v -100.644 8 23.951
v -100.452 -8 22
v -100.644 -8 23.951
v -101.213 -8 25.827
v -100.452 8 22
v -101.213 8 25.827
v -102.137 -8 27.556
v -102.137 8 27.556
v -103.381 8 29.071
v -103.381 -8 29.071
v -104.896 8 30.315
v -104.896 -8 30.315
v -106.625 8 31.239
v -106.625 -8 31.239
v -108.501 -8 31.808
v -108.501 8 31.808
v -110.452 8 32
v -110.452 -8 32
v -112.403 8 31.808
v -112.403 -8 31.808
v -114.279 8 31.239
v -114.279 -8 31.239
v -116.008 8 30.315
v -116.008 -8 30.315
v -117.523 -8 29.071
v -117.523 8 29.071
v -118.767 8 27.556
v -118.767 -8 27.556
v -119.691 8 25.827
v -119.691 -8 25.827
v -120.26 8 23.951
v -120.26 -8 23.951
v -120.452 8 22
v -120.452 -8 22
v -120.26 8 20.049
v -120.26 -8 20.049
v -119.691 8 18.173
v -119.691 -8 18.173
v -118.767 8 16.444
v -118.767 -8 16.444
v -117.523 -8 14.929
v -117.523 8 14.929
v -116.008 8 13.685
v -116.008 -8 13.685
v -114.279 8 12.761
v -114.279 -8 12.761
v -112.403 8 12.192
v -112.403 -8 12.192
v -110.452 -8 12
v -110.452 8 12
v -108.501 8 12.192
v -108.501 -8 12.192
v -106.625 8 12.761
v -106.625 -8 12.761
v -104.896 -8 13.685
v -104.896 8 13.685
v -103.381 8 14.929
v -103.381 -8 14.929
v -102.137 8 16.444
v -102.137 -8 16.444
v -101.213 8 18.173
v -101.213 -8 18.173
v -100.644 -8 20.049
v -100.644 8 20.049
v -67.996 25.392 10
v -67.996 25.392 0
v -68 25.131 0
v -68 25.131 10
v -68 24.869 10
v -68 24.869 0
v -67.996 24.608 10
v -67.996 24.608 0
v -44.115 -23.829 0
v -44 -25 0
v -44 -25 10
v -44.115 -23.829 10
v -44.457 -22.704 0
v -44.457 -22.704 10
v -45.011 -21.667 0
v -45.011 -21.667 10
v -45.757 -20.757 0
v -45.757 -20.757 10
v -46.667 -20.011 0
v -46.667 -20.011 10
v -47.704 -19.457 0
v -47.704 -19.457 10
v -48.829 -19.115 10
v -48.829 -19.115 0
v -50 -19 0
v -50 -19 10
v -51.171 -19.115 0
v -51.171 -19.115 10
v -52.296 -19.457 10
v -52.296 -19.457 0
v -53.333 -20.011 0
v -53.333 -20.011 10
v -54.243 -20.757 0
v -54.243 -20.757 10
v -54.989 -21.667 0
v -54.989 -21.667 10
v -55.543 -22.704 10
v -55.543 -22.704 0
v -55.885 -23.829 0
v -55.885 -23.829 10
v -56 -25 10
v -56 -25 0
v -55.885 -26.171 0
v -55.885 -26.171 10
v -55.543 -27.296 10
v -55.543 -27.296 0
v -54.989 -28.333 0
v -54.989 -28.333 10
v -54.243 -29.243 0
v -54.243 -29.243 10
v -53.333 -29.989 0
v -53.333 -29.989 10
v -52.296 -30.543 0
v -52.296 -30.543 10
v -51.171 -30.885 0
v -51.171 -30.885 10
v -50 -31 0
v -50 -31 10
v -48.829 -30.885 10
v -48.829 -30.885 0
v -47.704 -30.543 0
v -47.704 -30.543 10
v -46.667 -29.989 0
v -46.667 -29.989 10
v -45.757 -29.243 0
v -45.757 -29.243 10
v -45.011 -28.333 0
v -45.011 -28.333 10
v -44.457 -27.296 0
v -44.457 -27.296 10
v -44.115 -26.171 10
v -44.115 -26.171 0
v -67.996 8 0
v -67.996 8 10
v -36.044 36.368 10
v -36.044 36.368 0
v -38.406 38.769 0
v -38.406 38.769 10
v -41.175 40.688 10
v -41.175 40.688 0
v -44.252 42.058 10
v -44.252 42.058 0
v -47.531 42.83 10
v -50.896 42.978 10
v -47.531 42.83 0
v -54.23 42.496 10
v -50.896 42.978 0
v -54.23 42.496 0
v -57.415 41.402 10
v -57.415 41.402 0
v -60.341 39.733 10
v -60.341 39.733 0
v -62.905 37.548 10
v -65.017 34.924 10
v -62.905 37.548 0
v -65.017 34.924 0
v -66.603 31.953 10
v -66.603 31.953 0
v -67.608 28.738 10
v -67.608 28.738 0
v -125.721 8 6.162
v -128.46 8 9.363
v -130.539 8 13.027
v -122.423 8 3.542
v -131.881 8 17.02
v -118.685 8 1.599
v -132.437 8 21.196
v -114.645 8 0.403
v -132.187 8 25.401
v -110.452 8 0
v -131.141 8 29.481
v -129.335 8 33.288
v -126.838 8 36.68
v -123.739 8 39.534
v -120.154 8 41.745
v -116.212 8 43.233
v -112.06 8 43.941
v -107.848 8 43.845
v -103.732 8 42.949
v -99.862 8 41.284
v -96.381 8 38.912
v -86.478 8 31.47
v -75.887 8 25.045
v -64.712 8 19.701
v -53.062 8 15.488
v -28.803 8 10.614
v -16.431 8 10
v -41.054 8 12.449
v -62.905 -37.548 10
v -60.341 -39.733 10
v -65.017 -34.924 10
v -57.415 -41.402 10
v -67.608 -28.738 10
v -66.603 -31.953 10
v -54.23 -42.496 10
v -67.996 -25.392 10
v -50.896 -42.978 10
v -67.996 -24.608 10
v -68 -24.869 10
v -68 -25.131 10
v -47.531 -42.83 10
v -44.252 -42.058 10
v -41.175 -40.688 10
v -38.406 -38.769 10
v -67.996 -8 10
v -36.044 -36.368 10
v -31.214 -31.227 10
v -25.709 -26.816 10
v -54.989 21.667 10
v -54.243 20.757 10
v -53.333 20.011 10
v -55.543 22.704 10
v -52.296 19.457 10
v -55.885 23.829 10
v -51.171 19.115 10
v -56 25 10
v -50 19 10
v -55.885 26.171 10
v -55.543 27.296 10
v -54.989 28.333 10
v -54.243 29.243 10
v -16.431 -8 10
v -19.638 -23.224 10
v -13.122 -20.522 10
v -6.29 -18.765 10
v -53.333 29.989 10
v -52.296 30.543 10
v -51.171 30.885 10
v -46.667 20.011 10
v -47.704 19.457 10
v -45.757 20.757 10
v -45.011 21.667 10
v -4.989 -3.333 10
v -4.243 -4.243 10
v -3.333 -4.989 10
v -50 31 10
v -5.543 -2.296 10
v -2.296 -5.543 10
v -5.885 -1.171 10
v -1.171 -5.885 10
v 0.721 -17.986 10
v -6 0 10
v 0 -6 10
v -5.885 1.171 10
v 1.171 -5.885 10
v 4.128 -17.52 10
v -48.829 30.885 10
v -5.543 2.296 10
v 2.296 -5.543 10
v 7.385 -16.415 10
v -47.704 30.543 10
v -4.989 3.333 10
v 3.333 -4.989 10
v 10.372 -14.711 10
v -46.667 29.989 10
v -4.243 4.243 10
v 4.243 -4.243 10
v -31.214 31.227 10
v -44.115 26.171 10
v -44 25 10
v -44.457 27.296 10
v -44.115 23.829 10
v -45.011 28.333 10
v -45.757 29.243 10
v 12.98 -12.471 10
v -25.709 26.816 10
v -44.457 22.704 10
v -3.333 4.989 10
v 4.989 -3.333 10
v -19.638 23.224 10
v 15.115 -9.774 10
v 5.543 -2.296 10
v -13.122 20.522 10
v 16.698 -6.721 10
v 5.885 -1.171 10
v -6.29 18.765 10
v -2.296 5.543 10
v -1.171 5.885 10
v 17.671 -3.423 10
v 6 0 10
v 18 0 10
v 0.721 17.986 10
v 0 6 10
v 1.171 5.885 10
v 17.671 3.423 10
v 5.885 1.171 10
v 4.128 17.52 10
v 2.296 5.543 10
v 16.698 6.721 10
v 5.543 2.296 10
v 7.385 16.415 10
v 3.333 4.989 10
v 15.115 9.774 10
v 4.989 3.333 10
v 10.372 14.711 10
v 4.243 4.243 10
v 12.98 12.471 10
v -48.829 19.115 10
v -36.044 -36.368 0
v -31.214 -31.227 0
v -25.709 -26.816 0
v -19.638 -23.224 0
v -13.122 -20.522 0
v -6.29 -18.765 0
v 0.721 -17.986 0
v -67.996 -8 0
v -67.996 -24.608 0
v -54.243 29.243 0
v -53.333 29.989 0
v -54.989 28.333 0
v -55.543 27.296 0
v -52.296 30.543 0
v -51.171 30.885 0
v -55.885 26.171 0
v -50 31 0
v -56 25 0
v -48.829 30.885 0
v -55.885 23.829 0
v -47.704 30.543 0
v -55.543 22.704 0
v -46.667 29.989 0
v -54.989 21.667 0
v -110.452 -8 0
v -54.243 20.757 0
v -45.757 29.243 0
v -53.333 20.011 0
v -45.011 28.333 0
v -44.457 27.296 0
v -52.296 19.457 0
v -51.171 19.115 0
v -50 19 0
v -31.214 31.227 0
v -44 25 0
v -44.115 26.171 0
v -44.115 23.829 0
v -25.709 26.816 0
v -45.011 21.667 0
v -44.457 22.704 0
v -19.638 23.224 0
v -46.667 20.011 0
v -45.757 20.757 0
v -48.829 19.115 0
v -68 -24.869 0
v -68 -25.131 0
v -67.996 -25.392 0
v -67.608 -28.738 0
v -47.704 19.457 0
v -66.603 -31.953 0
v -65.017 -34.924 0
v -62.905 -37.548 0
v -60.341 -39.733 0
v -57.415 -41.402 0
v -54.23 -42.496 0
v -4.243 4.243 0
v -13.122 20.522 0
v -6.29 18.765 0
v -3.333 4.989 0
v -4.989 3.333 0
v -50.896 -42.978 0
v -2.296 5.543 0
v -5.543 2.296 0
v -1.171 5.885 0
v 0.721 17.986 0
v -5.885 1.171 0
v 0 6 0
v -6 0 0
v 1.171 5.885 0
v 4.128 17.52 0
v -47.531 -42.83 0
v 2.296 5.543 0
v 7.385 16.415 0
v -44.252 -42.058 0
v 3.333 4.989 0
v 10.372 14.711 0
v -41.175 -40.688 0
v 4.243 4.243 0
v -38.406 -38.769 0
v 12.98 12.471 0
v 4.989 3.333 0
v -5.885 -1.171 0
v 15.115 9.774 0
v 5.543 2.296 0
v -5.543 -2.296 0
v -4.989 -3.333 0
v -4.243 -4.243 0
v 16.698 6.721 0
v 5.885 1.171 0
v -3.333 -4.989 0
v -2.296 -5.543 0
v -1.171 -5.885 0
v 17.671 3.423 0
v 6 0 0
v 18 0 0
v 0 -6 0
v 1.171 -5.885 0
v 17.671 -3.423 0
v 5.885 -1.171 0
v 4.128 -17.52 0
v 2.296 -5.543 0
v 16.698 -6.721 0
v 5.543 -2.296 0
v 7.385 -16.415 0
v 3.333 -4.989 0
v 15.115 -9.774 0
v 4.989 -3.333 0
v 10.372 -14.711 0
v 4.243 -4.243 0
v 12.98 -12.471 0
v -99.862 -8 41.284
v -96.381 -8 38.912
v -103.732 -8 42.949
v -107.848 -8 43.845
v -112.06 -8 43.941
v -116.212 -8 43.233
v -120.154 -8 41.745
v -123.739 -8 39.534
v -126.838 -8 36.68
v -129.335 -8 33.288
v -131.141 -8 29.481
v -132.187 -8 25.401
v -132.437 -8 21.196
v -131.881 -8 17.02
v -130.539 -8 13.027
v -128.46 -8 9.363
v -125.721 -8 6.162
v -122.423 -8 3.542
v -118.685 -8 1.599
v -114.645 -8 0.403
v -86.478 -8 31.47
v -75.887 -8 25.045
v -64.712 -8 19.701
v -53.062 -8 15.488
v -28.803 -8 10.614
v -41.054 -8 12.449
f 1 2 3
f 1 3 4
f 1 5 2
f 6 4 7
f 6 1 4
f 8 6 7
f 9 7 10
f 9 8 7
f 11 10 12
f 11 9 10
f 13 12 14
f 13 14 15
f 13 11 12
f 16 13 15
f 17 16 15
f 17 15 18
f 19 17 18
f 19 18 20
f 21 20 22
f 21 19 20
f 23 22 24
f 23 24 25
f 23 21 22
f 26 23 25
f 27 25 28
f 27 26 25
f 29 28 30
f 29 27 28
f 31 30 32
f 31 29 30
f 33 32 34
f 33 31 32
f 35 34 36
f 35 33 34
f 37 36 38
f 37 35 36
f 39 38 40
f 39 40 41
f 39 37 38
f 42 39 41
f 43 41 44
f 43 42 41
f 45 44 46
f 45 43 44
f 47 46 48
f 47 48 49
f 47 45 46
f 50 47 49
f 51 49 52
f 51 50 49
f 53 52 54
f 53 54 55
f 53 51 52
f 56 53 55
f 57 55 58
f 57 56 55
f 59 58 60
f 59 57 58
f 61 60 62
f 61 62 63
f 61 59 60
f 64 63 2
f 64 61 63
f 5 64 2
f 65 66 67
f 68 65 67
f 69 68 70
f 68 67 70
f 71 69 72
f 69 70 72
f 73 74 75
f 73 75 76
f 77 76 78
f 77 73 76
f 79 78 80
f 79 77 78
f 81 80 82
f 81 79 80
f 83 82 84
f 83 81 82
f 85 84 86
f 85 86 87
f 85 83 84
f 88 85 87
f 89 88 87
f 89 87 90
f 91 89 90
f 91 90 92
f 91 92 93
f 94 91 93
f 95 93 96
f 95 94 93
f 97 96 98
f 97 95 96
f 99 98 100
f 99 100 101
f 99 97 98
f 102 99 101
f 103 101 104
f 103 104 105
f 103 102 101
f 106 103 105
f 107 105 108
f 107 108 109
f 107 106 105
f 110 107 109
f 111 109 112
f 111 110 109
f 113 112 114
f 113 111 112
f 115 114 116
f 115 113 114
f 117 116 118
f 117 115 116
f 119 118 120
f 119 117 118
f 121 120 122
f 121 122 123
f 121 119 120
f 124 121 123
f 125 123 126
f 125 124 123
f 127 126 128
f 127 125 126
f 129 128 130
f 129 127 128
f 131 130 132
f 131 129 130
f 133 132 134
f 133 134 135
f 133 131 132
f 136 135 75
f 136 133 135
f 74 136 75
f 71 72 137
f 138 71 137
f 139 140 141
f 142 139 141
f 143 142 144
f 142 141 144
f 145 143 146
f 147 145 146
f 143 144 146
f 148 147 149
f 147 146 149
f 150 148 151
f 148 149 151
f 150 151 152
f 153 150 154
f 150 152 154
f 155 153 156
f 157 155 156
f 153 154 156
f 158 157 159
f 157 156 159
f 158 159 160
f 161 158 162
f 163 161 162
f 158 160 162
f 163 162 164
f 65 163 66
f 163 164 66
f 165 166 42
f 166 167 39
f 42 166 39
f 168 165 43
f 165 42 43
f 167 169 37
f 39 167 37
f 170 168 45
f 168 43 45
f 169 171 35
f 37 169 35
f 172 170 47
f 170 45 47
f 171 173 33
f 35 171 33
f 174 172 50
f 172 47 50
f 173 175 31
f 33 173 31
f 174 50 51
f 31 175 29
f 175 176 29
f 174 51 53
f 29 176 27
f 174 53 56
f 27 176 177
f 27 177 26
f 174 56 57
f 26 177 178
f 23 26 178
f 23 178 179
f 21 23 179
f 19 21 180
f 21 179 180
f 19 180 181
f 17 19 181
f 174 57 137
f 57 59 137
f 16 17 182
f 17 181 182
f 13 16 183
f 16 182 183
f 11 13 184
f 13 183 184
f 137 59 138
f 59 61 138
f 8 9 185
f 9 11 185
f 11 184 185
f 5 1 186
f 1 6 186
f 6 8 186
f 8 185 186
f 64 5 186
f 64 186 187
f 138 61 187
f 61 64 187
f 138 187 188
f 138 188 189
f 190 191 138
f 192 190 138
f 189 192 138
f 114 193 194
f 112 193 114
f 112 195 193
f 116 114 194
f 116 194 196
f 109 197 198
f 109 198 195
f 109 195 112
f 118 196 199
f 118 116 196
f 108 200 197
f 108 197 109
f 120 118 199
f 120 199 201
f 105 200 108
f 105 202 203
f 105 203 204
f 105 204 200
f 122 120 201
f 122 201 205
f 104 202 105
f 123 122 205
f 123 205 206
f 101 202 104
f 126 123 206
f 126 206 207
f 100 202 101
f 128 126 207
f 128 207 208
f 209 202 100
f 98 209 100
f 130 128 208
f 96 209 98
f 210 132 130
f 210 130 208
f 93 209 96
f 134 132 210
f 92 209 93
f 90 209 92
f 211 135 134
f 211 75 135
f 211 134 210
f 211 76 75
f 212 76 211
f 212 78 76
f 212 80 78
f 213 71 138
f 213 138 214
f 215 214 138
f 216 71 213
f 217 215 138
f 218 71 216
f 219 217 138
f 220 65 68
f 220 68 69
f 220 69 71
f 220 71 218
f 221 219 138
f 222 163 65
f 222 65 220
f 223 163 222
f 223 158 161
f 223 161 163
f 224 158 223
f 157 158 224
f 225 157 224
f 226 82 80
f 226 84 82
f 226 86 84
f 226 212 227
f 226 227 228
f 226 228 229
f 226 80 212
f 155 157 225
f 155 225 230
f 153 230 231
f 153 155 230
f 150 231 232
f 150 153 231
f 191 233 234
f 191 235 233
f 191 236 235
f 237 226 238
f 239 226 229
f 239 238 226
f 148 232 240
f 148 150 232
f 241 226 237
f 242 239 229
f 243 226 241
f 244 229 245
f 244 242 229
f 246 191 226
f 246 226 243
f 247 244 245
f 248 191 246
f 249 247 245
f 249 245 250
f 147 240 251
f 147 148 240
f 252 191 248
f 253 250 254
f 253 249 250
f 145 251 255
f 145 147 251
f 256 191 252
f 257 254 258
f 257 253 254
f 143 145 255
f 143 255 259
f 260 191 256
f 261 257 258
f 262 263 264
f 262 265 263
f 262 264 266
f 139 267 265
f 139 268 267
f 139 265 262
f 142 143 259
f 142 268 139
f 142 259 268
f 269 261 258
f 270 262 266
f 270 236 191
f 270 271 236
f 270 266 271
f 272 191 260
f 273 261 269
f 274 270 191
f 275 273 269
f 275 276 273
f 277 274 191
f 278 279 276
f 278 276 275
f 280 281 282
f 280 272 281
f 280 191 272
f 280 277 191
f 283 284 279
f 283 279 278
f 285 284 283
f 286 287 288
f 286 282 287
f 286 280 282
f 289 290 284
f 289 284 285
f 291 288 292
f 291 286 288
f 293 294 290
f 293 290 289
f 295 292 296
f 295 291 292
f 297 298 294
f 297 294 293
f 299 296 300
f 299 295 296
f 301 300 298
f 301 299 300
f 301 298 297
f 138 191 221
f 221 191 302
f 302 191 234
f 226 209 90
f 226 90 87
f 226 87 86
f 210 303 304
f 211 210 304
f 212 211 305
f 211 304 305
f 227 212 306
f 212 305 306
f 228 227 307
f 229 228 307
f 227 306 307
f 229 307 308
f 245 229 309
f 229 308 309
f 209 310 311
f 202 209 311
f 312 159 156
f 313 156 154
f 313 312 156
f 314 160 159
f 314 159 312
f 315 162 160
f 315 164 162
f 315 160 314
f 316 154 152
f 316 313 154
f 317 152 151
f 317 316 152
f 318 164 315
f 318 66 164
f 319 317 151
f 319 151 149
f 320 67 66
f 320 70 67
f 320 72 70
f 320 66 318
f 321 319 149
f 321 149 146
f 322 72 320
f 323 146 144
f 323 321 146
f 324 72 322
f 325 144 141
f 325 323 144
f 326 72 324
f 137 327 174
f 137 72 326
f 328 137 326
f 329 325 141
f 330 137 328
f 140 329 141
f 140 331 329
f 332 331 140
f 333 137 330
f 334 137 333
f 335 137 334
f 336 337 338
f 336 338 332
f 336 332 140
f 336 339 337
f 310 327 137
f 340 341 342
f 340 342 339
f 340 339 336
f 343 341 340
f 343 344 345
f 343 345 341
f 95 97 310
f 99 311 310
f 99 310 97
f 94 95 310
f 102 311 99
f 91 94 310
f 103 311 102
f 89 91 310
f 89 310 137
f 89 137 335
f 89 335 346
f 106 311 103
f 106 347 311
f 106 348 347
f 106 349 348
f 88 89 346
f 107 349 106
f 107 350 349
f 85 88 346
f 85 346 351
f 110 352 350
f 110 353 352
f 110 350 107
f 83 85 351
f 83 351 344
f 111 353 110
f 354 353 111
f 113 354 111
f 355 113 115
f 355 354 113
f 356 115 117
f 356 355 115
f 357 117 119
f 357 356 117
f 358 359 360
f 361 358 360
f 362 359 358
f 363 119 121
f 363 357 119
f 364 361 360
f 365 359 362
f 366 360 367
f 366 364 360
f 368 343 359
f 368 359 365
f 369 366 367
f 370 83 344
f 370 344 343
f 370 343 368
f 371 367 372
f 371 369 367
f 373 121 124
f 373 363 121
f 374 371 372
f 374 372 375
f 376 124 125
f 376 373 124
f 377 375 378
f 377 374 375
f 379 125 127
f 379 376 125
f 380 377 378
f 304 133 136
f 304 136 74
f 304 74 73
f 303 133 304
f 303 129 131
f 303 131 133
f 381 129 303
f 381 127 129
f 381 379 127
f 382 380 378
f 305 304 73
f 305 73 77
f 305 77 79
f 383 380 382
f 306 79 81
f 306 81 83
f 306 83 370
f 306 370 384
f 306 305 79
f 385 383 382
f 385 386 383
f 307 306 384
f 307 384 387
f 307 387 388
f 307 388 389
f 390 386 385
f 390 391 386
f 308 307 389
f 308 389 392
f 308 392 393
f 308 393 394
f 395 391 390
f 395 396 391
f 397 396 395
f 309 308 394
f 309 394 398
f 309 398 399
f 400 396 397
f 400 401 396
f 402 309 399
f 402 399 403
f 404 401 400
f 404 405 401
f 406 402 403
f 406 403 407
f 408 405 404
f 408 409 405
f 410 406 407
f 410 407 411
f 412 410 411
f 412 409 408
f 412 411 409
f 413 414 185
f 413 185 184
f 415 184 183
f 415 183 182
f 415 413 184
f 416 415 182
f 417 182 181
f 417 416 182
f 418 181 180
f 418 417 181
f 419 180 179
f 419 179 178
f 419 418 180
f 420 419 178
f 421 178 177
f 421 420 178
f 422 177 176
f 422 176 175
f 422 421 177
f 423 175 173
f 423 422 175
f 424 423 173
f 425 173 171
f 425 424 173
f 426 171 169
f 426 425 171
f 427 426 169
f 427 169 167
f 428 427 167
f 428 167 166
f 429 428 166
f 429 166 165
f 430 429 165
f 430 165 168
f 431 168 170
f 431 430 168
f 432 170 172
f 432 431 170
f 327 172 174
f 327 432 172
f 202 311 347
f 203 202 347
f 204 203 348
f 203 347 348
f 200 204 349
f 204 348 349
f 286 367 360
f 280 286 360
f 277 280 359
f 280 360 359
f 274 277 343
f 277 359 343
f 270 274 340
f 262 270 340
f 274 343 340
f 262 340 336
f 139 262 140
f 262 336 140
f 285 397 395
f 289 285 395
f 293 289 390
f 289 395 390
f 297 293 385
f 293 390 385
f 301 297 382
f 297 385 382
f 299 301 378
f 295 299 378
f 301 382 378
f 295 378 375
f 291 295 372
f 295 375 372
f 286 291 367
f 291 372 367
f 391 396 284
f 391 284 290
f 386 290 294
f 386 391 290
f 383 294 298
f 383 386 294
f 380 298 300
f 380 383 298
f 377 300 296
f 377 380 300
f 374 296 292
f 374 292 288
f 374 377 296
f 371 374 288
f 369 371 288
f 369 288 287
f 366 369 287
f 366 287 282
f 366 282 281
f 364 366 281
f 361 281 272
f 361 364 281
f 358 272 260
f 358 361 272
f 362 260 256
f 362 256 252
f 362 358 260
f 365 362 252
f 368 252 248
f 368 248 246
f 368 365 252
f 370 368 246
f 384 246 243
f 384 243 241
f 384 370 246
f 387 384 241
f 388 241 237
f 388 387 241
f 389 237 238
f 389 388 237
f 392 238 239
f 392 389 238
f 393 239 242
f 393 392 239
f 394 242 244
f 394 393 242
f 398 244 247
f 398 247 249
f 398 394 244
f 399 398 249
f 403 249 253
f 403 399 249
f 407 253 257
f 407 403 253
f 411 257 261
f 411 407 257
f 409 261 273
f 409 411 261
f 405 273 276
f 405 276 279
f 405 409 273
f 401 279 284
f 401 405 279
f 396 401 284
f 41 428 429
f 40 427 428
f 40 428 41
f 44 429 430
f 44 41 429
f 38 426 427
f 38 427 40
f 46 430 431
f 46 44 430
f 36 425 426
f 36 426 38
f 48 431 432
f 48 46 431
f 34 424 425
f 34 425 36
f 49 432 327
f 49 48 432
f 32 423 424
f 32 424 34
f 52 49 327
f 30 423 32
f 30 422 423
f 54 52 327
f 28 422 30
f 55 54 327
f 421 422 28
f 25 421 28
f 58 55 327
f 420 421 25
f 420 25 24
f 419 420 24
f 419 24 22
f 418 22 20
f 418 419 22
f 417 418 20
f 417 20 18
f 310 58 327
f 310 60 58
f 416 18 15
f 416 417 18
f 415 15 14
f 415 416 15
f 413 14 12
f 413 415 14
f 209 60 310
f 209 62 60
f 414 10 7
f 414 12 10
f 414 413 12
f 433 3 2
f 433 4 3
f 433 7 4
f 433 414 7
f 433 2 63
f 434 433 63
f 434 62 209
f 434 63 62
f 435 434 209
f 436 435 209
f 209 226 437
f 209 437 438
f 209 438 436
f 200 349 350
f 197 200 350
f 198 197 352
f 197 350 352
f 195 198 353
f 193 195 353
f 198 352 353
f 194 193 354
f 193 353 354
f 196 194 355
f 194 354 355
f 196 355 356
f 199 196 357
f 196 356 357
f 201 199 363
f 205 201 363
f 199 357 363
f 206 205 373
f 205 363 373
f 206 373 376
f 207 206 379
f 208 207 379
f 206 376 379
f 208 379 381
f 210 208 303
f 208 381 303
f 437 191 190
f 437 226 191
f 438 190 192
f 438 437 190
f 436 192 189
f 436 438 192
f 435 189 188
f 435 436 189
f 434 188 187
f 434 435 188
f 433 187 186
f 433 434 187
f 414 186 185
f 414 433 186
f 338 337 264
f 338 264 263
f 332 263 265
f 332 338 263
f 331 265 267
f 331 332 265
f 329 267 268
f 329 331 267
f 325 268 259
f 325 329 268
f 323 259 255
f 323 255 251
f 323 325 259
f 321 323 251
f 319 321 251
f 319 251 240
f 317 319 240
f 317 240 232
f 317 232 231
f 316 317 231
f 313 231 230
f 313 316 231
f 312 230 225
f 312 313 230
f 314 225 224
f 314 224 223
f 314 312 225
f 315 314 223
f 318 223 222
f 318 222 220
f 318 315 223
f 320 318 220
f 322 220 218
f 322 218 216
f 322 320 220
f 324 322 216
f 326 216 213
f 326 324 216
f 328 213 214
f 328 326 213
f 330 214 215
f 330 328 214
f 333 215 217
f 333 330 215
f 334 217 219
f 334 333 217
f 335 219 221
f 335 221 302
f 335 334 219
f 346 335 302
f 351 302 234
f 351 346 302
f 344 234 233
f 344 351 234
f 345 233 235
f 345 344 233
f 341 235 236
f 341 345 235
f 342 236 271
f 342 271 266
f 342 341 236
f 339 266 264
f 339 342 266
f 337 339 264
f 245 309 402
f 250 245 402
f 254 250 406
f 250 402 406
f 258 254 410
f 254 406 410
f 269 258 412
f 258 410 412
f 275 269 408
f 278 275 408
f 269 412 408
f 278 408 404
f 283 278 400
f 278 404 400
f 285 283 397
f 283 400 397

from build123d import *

# Parameters (mm, degrees)
F0_R     = 6
F1_DEPTH = 10
F2_R     = 10
F3_DEPTH = 8


with BuildPart() as f1:
    # F0 (on Top) → F1 (new body)
    with BuildSketch(Plane.XY):
        with BuildLine():
            ThreePointArc((0.720724, -17.985565), (12.980236, -12.470505), (18, 0))
            ThreePointArc((18, 0), (12.980236, 12.470505), (0.720724, 17.985565))
            ThreePointArc((0.720724, 17.985565), (-18, 0), (0.720724, -17.985565))
        make_face()
        Circle(F0_R, mode=Mode.SUBTRACT)
        with BuildLine():
            ThreePointArc((0.720724, -17.985565), (-18, 0), (0.720724, 17.985565))
            ThreePointArc((0.720724, 17.985565), (-19.637945, 23.224109), (-36.043982, 36.367918))
            ThreePointArc((-36.043982, 36.367918), (-33.041104, 31.032896), (-32, 25))
            ThreePointArc((-32, 25), (-49.804119, 7.001066), (-67.995737, 24.608261))
            Line((-67.995737, 24.608261), (-67.995737, -24.608261))
            ThreePointArc((-67.995737, -24.608261), (-49.804119, -7.001066), (-32, -25))
            ThreePointArc((-32, -25), (-33.041104, -31.032896), (-36.043982, -36.367918))
            ThreePointArc((-36.043982, -36.367918), (-19.637945, -23.224109), (0.720724, -17.985565))
        make_face()
        with BuildLine():
            ThreePointArc((-32, 25), (-33.041104, 31.032896), (-36.043982, 36.367918))
            ThreePointArc((-36.043982, 36.367918), (-55.847988, 42.023544), (-67.995737, 25.391739))
            Line((-67.995737, 25.391739), (-67.995737, 24.608261))
            ThreePointArc((-67.995737, 24.608261), (-49.804119, 7.001066), (-32, 25))
        make_face()
        with Locations((-50, 25)):
            Circle(F0_R, mode=Mode.SUBTRACT)
        with BuildLine():
            ThreePointArc((-67.995737, -25.391739), (-55.847988, -42.023544), (-36.043982, -36.367918))
            ThreePointArc((-36.043982, -36.367918), (-33.041104, -31.032896), (-32, -25))
            ThreePointArc((-32, -25), (-49.804119, -7.001066), (-67.995737, -24.608261))
            Line((-67.995737, -24.608261), (-67.995737, -25.391739))
        make_face()
        with Locations((-50, -25)):
            Circle(F0_R, mode=Mode.SUBTRACT)
        with BuildLine():
            Line((-67.995737, 24.608261), (-67.995737, 25.391739))
            ThreePointArc((-67.995737, 25.391739), (-68, 25), (-67.995737, 24.608261))
        make_face()
        with BuildLine():
            ThreePointArc((-67.995737, -24.608261), (-68, -25), (-67.995737, -25.391739))
            Line((-67.995737, -25.391739), (-67.995737, -24.608261))
        make_face()
    extrude(amount=F1_DEPTH)

    # F2 (on Front) → F3 (join, symmetric)
    with BuildSketch(Plane.XZ):
        with BuildLine():
            ThreePointArc((-16.430688, 10), (-58.939191, 17.449895), (-96.380751, 38.911565))
            ThreePointArc((-96.380751, 38.911565), (-131.140781, 29.481496), (-110.451962, 0))
            Line((-110.451962, 0), (-16.430688, 0))
            Line((-16.430688, 0), (-16.430688, 10))
        make_face()
        with Locations((-110.451962, 22)):
            Circle(F2_R, mode=Mode.SUBTRACT)
    extrude(amount=F3_DEPTH, both=True)


solid = f1.part
